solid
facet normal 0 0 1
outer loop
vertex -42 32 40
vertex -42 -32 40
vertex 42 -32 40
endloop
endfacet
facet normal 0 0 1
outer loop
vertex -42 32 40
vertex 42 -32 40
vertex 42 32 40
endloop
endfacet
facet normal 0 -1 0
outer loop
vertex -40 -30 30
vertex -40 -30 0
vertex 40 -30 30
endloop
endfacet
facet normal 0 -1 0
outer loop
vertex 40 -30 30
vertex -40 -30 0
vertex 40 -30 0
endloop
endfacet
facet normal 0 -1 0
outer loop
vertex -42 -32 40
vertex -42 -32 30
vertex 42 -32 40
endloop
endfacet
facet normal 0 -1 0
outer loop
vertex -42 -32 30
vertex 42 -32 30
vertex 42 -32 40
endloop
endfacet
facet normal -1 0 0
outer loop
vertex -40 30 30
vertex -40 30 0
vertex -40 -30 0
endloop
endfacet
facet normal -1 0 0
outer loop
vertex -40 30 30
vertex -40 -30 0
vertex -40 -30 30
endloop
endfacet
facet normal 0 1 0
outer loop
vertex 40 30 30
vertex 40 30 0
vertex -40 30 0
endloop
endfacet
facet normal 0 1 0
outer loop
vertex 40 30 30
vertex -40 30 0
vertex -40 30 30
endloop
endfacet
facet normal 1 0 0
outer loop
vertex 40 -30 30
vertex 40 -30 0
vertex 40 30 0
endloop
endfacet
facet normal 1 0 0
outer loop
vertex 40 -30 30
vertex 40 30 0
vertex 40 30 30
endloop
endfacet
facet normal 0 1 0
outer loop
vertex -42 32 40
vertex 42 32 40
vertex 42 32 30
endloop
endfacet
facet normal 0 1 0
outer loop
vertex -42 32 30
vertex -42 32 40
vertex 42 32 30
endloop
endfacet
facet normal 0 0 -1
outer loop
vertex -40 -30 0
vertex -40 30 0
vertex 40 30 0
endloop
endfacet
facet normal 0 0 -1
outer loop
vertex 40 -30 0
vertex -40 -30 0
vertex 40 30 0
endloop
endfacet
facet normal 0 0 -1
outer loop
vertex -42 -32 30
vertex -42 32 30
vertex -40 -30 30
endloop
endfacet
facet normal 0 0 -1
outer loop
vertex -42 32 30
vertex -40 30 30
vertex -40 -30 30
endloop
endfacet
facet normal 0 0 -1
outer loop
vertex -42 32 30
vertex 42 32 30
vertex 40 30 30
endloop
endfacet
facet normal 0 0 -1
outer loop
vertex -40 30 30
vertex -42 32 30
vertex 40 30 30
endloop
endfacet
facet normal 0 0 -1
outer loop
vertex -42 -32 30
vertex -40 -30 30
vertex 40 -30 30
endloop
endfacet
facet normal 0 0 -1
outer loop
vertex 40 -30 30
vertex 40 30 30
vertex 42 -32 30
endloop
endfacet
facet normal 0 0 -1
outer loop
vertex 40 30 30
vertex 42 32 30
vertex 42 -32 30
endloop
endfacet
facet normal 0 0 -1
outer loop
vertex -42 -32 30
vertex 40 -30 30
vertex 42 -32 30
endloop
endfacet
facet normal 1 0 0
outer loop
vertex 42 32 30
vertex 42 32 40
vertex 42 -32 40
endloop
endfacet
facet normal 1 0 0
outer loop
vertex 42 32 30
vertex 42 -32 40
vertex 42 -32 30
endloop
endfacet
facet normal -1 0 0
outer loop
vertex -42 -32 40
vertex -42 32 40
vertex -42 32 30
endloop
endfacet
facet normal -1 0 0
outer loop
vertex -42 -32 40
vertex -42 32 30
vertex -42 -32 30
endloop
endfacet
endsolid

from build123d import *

# Parameters (mm, degrees)
F0_W     = 80
F0_H     = 60
F1_DEPTH = 40
F2_W     = 80
F2_H     = 10
F3_DEPTH = 2
F5_DEPTH = 2
F7_DEPTH = 2
F9_DEPTH = 2


with BuildPart() as f1:
    # F0 (on Top) → F1 (new body)
    with BuildSketch(Plane.XY):
        Rectangle(F0_W, F0_H)
    extrude(amount=F1_DEPTH)

    # F2 (on face) → F3 (join)
    with BuildSketch(Plane.XZ.offset(30)):
        with Locations((0, 35)):
            Rectangle(F2_W, F2_H)
    extrude(amount=F3_DEPTH)

    # F4 (on face) → F5 (join)
    with BuildSketch(Plane.YZ.offset(40)):
        Polygon((-32, 40), (-32, 30), (-30, 30), (30, 30), (30, 40), align=None)
    extrude(amount=F5_DEPTH)

    # F6 (on face) → F7 (join)
    with BuildSketch(Plane(origin=(0, 30, 0), x_dir=(-1, 0, 0), z_dir=(0, 1, 0))):
        Polygon((-42, 40), (-42, 30), (-40, 30), (40, 30), (40, 40), align=None)
    extrude(amount=F7_DEPTH)

    # F8 (on face) → F9 (join)
    with BuildSketch(Plane(origin=(-40, 0, 0), x_dir=(0, -1, 0), z_dir=(-1, 0, 0))):
        Polygon((-32, 40), (-32, 30), (-30, 30), (30, 30), (32, 30), (32, 40), align=None)
    extrude(amount=F9_DEPTH)


solid = f1.part
